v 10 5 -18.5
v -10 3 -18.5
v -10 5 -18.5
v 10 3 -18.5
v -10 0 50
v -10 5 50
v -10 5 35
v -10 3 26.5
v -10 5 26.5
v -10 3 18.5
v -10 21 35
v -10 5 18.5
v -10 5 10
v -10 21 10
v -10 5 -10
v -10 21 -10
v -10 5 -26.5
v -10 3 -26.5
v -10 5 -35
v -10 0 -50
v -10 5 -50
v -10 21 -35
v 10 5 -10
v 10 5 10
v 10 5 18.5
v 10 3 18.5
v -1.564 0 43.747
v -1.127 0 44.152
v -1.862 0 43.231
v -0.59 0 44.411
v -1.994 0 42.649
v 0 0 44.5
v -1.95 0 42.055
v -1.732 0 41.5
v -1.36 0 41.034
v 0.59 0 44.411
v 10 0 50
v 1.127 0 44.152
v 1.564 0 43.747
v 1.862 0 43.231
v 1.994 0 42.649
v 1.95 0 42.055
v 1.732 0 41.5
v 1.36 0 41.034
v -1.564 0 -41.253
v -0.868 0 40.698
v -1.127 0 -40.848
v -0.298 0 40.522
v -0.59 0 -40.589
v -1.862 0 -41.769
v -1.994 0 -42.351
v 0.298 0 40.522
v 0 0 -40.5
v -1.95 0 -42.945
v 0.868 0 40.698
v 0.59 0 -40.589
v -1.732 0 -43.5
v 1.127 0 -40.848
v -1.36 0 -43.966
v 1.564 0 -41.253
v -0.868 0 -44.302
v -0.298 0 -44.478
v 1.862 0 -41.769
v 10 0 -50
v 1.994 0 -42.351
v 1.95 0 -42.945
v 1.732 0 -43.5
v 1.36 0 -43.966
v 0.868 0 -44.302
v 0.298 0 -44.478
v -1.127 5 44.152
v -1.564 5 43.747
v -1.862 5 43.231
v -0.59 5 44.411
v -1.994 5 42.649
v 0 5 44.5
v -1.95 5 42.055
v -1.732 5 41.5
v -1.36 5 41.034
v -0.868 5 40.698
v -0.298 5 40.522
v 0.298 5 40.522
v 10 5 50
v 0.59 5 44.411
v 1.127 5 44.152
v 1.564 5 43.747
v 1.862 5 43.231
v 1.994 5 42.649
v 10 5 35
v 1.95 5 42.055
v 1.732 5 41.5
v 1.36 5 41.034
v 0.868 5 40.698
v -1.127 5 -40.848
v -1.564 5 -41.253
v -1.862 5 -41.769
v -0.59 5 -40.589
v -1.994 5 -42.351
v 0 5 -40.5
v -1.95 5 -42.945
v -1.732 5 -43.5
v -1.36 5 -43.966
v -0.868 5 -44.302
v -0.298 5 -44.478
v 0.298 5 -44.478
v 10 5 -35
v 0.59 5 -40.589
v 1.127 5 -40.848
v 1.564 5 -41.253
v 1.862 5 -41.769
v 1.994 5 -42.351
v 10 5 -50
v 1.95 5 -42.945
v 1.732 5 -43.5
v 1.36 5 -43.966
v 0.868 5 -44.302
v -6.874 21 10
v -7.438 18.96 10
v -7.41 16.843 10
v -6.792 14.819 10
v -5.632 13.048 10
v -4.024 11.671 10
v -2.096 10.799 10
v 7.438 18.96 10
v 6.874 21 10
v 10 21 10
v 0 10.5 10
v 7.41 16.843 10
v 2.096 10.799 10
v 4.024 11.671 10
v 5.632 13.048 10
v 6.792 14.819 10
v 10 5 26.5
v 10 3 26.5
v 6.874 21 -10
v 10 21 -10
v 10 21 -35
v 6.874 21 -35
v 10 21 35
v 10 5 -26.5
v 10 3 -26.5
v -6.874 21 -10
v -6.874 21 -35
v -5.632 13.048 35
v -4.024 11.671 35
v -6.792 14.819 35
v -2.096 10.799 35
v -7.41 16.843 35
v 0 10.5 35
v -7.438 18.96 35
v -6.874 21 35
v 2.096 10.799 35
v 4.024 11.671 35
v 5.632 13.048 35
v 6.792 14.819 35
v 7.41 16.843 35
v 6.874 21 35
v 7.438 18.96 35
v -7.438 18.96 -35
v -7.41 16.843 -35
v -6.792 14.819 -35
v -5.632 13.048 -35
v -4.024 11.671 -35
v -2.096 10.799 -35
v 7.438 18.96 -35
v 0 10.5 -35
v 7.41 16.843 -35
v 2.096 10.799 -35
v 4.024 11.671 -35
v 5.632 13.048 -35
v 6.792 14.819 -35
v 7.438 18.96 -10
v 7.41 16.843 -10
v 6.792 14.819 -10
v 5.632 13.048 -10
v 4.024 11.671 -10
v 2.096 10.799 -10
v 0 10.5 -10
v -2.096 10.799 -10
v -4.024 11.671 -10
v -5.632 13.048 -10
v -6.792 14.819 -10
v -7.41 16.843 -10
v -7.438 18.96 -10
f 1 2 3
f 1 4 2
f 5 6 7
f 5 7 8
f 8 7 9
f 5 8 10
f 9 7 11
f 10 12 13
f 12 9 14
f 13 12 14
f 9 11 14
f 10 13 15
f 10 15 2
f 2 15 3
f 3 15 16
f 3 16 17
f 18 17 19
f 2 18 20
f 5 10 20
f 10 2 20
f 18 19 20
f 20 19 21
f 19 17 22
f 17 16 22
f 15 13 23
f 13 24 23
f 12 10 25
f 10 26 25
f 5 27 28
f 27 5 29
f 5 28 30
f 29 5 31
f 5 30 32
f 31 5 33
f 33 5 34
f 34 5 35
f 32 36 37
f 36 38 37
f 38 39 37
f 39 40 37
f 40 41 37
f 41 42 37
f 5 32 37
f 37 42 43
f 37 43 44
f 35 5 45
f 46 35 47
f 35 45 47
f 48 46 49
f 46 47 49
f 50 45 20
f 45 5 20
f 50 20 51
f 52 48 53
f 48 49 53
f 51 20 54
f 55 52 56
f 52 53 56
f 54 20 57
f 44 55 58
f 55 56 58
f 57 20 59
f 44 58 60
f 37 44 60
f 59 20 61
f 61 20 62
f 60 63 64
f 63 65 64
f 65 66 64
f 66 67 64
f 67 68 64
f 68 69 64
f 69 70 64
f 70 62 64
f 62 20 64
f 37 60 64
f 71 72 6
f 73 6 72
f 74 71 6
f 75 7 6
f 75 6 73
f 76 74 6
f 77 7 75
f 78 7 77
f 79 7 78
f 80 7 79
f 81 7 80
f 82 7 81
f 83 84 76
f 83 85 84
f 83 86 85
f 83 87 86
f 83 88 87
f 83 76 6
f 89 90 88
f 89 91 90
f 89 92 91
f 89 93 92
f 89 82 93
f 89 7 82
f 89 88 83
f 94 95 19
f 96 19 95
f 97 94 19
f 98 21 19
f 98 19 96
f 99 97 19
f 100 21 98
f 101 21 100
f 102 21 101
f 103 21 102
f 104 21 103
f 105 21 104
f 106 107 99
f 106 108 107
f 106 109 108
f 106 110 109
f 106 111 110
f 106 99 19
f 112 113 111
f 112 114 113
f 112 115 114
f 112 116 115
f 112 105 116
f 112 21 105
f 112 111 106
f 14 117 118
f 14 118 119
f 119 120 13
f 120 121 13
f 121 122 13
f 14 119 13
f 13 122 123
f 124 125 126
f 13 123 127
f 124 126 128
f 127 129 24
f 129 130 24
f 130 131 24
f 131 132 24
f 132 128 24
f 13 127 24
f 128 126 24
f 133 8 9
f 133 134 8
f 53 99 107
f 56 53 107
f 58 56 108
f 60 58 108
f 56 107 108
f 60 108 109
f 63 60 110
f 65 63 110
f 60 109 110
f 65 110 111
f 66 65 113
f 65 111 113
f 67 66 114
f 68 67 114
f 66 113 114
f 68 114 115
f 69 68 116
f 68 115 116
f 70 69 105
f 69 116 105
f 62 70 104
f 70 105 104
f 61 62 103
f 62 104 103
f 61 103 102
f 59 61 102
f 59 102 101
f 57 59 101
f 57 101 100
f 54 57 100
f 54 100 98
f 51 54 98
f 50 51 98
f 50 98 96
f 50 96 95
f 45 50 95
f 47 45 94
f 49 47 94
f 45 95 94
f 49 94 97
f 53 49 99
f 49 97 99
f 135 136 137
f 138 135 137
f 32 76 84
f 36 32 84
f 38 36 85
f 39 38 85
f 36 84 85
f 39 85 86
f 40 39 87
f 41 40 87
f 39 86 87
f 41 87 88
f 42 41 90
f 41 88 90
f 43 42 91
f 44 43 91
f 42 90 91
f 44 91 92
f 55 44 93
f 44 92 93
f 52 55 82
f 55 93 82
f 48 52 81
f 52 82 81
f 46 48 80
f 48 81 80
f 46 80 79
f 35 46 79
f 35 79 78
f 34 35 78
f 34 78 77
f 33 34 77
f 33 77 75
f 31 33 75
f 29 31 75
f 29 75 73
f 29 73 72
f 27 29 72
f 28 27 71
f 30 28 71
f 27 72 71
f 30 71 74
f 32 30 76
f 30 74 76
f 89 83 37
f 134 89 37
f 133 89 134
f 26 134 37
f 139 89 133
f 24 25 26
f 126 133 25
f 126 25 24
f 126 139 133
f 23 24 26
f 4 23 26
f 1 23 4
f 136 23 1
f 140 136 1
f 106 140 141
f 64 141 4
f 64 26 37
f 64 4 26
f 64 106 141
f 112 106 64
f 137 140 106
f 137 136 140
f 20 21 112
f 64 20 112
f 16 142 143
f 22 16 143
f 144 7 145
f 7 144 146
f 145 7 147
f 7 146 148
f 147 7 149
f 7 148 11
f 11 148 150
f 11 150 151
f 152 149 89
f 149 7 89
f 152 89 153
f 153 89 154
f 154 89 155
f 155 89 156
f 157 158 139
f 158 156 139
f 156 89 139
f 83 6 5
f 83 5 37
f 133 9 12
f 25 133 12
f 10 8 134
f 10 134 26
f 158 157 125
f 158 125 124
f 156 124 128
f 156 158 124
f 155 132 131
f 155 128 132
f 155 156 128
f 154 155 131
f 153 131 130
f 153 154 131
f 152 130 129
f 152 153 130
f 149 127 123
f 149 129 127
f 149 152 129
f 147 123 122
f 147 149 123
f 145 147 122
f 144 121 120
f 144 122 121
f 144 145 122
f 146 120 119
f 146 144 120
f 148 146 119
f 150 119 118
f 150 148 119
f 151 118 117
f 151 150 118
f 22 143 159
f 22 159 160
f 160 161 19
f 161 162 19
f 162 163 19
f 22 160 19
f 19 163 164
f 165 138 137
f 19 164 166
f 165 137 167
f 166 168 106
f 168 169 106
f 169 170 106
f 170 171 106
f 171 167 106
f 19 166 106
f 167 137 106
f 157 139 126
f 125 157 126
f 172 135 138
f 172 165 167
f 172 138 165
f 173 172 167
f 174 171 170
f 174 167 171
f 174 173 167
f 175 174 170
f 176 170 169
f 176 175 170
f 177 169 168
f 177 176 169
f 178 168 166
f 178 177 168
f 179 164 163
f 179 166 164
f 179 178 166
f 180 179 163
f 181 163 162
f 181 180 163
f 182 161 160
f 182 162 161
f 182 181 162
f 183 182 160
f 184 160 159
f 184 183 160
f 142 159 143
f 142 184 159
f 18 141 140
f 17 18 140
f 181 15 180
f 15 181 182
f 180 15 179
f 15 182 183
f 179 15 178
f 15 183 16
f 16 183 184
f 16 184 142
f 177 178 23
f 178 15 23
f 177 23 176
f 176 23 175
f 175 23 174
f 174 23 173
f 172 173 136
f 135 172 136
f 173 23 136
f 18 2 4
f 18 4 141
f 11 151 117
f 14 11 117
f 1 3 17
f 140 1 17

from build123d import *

# Parameters (mm, degrees)
ESBO_O1_W                = 8
ESBO_O1_H                = 2
RESSALTO_EXTRUS_O1_DEPTH = 10
CORTE_EXTRUS_O1_REACH    = 75.763
ESBO_O4_W                = 20
ESBO_O4_H                = 15
ESBO_O4_R                = 2
RESSALTO_EXTRUS_O2_DEPTH = 5


with BuildPart() as part:
    # Esboço1 → Ressalto-extrusão1 (new, symmetric)
    with BuildSketch(Plane(origin=(0, 0, 0), x_dir=(0, 0, -1), z_dir=(1, 0, 0))):
        Polygon((-35, 21), (-10, 21), (-10, 5), (10, 5), (10, 21), (35, 21), (35, 0), (-35, 0), align=None)
        with Locations((-22.5, 4)):
            Rectangle(ESBO_O1_W, ESBO_O1_H, mode=Mode.SUBTRACT)
        with Locations((22.5, 4)):
            Rectangle(ESBO_O1_W, ESBO_O1_H, mode=Mode.SUBTRACT)
    extrude(amount=RESSALTO_EXTRUS_O1_DEPTH, both=True)

    # Corte-extrusão1: up to this face of the body (flat: up to its plane)
    corte_extrus_o1_end = Plane(part.part.faces().sort_by_distance((0, 10.5, -35))[0])
    # Esboço2 → Corte-extrusão1 (cut, up to the picked face)
    with BuildSketch(Plane.XY.offset(35), mode=Mode.PRIVATE) as corte_extrus_o1_sk1:
        with BuildLine():
            Line((-6.873863542, 21), (6.873863542, 21))
            ThreePointArc((6.873863542, 21), (0, 10.5), (-6.873863542, 21))
        make_face()
    corte_extrus_o1_tool1 = split(extrude(corte_extrus_o1_sk1.sketch, amount=-CORTE_EXTRUS_O1_REACH, mode=Mode.PRIVATE), bisect_by=corte_extrus_o1_end, keep=Keep.BOTH, mode=Mode.PRIVATE)
    add(corte_extrus_o1_tool1.solids().sort_by(Axis((0, 16.361219, 35), (0, 0, -1)))[0], mode=Mode.SUBTRACT)

    # Esboço4 → Ressalto-extrusão2 (add)
    # profile 1 of 2: a face of its own
    with BuildSketch(Plane(origin=(0, 5, 0), x_dir=(1, 0, 0), z_dir=(0, 1, 0))):
        with Locations((0, 42.5)):
            Rectangle(ESBO_O4_W, ESBO_O4_H)
        with Locations(Location((0, 42.5, 0), (0, 0, 270))):
            Circle(ESBO_O4_R, mode=Mode.SUBTRACT)
    # profile 2 of 2: a face of its own
    with BuildSketch(Plane(origin=(0, 5, 0), x_dir=(1, 0, 0), z_dir=(0, 1, 0))):
        with Locations((0, -42.5)):
            Rectangle(ESBO_O4_W, ESBO_O4_H)
        with Locations(Location((0, -42.5, 0), (0, 0, 270))):
            Circle(ESBO_O4_R, mode=Mode.SUBTRACT)
    extrude(amount=-RESSALTO_EXTRUS_O2_DEPTH)


solid = part.part
